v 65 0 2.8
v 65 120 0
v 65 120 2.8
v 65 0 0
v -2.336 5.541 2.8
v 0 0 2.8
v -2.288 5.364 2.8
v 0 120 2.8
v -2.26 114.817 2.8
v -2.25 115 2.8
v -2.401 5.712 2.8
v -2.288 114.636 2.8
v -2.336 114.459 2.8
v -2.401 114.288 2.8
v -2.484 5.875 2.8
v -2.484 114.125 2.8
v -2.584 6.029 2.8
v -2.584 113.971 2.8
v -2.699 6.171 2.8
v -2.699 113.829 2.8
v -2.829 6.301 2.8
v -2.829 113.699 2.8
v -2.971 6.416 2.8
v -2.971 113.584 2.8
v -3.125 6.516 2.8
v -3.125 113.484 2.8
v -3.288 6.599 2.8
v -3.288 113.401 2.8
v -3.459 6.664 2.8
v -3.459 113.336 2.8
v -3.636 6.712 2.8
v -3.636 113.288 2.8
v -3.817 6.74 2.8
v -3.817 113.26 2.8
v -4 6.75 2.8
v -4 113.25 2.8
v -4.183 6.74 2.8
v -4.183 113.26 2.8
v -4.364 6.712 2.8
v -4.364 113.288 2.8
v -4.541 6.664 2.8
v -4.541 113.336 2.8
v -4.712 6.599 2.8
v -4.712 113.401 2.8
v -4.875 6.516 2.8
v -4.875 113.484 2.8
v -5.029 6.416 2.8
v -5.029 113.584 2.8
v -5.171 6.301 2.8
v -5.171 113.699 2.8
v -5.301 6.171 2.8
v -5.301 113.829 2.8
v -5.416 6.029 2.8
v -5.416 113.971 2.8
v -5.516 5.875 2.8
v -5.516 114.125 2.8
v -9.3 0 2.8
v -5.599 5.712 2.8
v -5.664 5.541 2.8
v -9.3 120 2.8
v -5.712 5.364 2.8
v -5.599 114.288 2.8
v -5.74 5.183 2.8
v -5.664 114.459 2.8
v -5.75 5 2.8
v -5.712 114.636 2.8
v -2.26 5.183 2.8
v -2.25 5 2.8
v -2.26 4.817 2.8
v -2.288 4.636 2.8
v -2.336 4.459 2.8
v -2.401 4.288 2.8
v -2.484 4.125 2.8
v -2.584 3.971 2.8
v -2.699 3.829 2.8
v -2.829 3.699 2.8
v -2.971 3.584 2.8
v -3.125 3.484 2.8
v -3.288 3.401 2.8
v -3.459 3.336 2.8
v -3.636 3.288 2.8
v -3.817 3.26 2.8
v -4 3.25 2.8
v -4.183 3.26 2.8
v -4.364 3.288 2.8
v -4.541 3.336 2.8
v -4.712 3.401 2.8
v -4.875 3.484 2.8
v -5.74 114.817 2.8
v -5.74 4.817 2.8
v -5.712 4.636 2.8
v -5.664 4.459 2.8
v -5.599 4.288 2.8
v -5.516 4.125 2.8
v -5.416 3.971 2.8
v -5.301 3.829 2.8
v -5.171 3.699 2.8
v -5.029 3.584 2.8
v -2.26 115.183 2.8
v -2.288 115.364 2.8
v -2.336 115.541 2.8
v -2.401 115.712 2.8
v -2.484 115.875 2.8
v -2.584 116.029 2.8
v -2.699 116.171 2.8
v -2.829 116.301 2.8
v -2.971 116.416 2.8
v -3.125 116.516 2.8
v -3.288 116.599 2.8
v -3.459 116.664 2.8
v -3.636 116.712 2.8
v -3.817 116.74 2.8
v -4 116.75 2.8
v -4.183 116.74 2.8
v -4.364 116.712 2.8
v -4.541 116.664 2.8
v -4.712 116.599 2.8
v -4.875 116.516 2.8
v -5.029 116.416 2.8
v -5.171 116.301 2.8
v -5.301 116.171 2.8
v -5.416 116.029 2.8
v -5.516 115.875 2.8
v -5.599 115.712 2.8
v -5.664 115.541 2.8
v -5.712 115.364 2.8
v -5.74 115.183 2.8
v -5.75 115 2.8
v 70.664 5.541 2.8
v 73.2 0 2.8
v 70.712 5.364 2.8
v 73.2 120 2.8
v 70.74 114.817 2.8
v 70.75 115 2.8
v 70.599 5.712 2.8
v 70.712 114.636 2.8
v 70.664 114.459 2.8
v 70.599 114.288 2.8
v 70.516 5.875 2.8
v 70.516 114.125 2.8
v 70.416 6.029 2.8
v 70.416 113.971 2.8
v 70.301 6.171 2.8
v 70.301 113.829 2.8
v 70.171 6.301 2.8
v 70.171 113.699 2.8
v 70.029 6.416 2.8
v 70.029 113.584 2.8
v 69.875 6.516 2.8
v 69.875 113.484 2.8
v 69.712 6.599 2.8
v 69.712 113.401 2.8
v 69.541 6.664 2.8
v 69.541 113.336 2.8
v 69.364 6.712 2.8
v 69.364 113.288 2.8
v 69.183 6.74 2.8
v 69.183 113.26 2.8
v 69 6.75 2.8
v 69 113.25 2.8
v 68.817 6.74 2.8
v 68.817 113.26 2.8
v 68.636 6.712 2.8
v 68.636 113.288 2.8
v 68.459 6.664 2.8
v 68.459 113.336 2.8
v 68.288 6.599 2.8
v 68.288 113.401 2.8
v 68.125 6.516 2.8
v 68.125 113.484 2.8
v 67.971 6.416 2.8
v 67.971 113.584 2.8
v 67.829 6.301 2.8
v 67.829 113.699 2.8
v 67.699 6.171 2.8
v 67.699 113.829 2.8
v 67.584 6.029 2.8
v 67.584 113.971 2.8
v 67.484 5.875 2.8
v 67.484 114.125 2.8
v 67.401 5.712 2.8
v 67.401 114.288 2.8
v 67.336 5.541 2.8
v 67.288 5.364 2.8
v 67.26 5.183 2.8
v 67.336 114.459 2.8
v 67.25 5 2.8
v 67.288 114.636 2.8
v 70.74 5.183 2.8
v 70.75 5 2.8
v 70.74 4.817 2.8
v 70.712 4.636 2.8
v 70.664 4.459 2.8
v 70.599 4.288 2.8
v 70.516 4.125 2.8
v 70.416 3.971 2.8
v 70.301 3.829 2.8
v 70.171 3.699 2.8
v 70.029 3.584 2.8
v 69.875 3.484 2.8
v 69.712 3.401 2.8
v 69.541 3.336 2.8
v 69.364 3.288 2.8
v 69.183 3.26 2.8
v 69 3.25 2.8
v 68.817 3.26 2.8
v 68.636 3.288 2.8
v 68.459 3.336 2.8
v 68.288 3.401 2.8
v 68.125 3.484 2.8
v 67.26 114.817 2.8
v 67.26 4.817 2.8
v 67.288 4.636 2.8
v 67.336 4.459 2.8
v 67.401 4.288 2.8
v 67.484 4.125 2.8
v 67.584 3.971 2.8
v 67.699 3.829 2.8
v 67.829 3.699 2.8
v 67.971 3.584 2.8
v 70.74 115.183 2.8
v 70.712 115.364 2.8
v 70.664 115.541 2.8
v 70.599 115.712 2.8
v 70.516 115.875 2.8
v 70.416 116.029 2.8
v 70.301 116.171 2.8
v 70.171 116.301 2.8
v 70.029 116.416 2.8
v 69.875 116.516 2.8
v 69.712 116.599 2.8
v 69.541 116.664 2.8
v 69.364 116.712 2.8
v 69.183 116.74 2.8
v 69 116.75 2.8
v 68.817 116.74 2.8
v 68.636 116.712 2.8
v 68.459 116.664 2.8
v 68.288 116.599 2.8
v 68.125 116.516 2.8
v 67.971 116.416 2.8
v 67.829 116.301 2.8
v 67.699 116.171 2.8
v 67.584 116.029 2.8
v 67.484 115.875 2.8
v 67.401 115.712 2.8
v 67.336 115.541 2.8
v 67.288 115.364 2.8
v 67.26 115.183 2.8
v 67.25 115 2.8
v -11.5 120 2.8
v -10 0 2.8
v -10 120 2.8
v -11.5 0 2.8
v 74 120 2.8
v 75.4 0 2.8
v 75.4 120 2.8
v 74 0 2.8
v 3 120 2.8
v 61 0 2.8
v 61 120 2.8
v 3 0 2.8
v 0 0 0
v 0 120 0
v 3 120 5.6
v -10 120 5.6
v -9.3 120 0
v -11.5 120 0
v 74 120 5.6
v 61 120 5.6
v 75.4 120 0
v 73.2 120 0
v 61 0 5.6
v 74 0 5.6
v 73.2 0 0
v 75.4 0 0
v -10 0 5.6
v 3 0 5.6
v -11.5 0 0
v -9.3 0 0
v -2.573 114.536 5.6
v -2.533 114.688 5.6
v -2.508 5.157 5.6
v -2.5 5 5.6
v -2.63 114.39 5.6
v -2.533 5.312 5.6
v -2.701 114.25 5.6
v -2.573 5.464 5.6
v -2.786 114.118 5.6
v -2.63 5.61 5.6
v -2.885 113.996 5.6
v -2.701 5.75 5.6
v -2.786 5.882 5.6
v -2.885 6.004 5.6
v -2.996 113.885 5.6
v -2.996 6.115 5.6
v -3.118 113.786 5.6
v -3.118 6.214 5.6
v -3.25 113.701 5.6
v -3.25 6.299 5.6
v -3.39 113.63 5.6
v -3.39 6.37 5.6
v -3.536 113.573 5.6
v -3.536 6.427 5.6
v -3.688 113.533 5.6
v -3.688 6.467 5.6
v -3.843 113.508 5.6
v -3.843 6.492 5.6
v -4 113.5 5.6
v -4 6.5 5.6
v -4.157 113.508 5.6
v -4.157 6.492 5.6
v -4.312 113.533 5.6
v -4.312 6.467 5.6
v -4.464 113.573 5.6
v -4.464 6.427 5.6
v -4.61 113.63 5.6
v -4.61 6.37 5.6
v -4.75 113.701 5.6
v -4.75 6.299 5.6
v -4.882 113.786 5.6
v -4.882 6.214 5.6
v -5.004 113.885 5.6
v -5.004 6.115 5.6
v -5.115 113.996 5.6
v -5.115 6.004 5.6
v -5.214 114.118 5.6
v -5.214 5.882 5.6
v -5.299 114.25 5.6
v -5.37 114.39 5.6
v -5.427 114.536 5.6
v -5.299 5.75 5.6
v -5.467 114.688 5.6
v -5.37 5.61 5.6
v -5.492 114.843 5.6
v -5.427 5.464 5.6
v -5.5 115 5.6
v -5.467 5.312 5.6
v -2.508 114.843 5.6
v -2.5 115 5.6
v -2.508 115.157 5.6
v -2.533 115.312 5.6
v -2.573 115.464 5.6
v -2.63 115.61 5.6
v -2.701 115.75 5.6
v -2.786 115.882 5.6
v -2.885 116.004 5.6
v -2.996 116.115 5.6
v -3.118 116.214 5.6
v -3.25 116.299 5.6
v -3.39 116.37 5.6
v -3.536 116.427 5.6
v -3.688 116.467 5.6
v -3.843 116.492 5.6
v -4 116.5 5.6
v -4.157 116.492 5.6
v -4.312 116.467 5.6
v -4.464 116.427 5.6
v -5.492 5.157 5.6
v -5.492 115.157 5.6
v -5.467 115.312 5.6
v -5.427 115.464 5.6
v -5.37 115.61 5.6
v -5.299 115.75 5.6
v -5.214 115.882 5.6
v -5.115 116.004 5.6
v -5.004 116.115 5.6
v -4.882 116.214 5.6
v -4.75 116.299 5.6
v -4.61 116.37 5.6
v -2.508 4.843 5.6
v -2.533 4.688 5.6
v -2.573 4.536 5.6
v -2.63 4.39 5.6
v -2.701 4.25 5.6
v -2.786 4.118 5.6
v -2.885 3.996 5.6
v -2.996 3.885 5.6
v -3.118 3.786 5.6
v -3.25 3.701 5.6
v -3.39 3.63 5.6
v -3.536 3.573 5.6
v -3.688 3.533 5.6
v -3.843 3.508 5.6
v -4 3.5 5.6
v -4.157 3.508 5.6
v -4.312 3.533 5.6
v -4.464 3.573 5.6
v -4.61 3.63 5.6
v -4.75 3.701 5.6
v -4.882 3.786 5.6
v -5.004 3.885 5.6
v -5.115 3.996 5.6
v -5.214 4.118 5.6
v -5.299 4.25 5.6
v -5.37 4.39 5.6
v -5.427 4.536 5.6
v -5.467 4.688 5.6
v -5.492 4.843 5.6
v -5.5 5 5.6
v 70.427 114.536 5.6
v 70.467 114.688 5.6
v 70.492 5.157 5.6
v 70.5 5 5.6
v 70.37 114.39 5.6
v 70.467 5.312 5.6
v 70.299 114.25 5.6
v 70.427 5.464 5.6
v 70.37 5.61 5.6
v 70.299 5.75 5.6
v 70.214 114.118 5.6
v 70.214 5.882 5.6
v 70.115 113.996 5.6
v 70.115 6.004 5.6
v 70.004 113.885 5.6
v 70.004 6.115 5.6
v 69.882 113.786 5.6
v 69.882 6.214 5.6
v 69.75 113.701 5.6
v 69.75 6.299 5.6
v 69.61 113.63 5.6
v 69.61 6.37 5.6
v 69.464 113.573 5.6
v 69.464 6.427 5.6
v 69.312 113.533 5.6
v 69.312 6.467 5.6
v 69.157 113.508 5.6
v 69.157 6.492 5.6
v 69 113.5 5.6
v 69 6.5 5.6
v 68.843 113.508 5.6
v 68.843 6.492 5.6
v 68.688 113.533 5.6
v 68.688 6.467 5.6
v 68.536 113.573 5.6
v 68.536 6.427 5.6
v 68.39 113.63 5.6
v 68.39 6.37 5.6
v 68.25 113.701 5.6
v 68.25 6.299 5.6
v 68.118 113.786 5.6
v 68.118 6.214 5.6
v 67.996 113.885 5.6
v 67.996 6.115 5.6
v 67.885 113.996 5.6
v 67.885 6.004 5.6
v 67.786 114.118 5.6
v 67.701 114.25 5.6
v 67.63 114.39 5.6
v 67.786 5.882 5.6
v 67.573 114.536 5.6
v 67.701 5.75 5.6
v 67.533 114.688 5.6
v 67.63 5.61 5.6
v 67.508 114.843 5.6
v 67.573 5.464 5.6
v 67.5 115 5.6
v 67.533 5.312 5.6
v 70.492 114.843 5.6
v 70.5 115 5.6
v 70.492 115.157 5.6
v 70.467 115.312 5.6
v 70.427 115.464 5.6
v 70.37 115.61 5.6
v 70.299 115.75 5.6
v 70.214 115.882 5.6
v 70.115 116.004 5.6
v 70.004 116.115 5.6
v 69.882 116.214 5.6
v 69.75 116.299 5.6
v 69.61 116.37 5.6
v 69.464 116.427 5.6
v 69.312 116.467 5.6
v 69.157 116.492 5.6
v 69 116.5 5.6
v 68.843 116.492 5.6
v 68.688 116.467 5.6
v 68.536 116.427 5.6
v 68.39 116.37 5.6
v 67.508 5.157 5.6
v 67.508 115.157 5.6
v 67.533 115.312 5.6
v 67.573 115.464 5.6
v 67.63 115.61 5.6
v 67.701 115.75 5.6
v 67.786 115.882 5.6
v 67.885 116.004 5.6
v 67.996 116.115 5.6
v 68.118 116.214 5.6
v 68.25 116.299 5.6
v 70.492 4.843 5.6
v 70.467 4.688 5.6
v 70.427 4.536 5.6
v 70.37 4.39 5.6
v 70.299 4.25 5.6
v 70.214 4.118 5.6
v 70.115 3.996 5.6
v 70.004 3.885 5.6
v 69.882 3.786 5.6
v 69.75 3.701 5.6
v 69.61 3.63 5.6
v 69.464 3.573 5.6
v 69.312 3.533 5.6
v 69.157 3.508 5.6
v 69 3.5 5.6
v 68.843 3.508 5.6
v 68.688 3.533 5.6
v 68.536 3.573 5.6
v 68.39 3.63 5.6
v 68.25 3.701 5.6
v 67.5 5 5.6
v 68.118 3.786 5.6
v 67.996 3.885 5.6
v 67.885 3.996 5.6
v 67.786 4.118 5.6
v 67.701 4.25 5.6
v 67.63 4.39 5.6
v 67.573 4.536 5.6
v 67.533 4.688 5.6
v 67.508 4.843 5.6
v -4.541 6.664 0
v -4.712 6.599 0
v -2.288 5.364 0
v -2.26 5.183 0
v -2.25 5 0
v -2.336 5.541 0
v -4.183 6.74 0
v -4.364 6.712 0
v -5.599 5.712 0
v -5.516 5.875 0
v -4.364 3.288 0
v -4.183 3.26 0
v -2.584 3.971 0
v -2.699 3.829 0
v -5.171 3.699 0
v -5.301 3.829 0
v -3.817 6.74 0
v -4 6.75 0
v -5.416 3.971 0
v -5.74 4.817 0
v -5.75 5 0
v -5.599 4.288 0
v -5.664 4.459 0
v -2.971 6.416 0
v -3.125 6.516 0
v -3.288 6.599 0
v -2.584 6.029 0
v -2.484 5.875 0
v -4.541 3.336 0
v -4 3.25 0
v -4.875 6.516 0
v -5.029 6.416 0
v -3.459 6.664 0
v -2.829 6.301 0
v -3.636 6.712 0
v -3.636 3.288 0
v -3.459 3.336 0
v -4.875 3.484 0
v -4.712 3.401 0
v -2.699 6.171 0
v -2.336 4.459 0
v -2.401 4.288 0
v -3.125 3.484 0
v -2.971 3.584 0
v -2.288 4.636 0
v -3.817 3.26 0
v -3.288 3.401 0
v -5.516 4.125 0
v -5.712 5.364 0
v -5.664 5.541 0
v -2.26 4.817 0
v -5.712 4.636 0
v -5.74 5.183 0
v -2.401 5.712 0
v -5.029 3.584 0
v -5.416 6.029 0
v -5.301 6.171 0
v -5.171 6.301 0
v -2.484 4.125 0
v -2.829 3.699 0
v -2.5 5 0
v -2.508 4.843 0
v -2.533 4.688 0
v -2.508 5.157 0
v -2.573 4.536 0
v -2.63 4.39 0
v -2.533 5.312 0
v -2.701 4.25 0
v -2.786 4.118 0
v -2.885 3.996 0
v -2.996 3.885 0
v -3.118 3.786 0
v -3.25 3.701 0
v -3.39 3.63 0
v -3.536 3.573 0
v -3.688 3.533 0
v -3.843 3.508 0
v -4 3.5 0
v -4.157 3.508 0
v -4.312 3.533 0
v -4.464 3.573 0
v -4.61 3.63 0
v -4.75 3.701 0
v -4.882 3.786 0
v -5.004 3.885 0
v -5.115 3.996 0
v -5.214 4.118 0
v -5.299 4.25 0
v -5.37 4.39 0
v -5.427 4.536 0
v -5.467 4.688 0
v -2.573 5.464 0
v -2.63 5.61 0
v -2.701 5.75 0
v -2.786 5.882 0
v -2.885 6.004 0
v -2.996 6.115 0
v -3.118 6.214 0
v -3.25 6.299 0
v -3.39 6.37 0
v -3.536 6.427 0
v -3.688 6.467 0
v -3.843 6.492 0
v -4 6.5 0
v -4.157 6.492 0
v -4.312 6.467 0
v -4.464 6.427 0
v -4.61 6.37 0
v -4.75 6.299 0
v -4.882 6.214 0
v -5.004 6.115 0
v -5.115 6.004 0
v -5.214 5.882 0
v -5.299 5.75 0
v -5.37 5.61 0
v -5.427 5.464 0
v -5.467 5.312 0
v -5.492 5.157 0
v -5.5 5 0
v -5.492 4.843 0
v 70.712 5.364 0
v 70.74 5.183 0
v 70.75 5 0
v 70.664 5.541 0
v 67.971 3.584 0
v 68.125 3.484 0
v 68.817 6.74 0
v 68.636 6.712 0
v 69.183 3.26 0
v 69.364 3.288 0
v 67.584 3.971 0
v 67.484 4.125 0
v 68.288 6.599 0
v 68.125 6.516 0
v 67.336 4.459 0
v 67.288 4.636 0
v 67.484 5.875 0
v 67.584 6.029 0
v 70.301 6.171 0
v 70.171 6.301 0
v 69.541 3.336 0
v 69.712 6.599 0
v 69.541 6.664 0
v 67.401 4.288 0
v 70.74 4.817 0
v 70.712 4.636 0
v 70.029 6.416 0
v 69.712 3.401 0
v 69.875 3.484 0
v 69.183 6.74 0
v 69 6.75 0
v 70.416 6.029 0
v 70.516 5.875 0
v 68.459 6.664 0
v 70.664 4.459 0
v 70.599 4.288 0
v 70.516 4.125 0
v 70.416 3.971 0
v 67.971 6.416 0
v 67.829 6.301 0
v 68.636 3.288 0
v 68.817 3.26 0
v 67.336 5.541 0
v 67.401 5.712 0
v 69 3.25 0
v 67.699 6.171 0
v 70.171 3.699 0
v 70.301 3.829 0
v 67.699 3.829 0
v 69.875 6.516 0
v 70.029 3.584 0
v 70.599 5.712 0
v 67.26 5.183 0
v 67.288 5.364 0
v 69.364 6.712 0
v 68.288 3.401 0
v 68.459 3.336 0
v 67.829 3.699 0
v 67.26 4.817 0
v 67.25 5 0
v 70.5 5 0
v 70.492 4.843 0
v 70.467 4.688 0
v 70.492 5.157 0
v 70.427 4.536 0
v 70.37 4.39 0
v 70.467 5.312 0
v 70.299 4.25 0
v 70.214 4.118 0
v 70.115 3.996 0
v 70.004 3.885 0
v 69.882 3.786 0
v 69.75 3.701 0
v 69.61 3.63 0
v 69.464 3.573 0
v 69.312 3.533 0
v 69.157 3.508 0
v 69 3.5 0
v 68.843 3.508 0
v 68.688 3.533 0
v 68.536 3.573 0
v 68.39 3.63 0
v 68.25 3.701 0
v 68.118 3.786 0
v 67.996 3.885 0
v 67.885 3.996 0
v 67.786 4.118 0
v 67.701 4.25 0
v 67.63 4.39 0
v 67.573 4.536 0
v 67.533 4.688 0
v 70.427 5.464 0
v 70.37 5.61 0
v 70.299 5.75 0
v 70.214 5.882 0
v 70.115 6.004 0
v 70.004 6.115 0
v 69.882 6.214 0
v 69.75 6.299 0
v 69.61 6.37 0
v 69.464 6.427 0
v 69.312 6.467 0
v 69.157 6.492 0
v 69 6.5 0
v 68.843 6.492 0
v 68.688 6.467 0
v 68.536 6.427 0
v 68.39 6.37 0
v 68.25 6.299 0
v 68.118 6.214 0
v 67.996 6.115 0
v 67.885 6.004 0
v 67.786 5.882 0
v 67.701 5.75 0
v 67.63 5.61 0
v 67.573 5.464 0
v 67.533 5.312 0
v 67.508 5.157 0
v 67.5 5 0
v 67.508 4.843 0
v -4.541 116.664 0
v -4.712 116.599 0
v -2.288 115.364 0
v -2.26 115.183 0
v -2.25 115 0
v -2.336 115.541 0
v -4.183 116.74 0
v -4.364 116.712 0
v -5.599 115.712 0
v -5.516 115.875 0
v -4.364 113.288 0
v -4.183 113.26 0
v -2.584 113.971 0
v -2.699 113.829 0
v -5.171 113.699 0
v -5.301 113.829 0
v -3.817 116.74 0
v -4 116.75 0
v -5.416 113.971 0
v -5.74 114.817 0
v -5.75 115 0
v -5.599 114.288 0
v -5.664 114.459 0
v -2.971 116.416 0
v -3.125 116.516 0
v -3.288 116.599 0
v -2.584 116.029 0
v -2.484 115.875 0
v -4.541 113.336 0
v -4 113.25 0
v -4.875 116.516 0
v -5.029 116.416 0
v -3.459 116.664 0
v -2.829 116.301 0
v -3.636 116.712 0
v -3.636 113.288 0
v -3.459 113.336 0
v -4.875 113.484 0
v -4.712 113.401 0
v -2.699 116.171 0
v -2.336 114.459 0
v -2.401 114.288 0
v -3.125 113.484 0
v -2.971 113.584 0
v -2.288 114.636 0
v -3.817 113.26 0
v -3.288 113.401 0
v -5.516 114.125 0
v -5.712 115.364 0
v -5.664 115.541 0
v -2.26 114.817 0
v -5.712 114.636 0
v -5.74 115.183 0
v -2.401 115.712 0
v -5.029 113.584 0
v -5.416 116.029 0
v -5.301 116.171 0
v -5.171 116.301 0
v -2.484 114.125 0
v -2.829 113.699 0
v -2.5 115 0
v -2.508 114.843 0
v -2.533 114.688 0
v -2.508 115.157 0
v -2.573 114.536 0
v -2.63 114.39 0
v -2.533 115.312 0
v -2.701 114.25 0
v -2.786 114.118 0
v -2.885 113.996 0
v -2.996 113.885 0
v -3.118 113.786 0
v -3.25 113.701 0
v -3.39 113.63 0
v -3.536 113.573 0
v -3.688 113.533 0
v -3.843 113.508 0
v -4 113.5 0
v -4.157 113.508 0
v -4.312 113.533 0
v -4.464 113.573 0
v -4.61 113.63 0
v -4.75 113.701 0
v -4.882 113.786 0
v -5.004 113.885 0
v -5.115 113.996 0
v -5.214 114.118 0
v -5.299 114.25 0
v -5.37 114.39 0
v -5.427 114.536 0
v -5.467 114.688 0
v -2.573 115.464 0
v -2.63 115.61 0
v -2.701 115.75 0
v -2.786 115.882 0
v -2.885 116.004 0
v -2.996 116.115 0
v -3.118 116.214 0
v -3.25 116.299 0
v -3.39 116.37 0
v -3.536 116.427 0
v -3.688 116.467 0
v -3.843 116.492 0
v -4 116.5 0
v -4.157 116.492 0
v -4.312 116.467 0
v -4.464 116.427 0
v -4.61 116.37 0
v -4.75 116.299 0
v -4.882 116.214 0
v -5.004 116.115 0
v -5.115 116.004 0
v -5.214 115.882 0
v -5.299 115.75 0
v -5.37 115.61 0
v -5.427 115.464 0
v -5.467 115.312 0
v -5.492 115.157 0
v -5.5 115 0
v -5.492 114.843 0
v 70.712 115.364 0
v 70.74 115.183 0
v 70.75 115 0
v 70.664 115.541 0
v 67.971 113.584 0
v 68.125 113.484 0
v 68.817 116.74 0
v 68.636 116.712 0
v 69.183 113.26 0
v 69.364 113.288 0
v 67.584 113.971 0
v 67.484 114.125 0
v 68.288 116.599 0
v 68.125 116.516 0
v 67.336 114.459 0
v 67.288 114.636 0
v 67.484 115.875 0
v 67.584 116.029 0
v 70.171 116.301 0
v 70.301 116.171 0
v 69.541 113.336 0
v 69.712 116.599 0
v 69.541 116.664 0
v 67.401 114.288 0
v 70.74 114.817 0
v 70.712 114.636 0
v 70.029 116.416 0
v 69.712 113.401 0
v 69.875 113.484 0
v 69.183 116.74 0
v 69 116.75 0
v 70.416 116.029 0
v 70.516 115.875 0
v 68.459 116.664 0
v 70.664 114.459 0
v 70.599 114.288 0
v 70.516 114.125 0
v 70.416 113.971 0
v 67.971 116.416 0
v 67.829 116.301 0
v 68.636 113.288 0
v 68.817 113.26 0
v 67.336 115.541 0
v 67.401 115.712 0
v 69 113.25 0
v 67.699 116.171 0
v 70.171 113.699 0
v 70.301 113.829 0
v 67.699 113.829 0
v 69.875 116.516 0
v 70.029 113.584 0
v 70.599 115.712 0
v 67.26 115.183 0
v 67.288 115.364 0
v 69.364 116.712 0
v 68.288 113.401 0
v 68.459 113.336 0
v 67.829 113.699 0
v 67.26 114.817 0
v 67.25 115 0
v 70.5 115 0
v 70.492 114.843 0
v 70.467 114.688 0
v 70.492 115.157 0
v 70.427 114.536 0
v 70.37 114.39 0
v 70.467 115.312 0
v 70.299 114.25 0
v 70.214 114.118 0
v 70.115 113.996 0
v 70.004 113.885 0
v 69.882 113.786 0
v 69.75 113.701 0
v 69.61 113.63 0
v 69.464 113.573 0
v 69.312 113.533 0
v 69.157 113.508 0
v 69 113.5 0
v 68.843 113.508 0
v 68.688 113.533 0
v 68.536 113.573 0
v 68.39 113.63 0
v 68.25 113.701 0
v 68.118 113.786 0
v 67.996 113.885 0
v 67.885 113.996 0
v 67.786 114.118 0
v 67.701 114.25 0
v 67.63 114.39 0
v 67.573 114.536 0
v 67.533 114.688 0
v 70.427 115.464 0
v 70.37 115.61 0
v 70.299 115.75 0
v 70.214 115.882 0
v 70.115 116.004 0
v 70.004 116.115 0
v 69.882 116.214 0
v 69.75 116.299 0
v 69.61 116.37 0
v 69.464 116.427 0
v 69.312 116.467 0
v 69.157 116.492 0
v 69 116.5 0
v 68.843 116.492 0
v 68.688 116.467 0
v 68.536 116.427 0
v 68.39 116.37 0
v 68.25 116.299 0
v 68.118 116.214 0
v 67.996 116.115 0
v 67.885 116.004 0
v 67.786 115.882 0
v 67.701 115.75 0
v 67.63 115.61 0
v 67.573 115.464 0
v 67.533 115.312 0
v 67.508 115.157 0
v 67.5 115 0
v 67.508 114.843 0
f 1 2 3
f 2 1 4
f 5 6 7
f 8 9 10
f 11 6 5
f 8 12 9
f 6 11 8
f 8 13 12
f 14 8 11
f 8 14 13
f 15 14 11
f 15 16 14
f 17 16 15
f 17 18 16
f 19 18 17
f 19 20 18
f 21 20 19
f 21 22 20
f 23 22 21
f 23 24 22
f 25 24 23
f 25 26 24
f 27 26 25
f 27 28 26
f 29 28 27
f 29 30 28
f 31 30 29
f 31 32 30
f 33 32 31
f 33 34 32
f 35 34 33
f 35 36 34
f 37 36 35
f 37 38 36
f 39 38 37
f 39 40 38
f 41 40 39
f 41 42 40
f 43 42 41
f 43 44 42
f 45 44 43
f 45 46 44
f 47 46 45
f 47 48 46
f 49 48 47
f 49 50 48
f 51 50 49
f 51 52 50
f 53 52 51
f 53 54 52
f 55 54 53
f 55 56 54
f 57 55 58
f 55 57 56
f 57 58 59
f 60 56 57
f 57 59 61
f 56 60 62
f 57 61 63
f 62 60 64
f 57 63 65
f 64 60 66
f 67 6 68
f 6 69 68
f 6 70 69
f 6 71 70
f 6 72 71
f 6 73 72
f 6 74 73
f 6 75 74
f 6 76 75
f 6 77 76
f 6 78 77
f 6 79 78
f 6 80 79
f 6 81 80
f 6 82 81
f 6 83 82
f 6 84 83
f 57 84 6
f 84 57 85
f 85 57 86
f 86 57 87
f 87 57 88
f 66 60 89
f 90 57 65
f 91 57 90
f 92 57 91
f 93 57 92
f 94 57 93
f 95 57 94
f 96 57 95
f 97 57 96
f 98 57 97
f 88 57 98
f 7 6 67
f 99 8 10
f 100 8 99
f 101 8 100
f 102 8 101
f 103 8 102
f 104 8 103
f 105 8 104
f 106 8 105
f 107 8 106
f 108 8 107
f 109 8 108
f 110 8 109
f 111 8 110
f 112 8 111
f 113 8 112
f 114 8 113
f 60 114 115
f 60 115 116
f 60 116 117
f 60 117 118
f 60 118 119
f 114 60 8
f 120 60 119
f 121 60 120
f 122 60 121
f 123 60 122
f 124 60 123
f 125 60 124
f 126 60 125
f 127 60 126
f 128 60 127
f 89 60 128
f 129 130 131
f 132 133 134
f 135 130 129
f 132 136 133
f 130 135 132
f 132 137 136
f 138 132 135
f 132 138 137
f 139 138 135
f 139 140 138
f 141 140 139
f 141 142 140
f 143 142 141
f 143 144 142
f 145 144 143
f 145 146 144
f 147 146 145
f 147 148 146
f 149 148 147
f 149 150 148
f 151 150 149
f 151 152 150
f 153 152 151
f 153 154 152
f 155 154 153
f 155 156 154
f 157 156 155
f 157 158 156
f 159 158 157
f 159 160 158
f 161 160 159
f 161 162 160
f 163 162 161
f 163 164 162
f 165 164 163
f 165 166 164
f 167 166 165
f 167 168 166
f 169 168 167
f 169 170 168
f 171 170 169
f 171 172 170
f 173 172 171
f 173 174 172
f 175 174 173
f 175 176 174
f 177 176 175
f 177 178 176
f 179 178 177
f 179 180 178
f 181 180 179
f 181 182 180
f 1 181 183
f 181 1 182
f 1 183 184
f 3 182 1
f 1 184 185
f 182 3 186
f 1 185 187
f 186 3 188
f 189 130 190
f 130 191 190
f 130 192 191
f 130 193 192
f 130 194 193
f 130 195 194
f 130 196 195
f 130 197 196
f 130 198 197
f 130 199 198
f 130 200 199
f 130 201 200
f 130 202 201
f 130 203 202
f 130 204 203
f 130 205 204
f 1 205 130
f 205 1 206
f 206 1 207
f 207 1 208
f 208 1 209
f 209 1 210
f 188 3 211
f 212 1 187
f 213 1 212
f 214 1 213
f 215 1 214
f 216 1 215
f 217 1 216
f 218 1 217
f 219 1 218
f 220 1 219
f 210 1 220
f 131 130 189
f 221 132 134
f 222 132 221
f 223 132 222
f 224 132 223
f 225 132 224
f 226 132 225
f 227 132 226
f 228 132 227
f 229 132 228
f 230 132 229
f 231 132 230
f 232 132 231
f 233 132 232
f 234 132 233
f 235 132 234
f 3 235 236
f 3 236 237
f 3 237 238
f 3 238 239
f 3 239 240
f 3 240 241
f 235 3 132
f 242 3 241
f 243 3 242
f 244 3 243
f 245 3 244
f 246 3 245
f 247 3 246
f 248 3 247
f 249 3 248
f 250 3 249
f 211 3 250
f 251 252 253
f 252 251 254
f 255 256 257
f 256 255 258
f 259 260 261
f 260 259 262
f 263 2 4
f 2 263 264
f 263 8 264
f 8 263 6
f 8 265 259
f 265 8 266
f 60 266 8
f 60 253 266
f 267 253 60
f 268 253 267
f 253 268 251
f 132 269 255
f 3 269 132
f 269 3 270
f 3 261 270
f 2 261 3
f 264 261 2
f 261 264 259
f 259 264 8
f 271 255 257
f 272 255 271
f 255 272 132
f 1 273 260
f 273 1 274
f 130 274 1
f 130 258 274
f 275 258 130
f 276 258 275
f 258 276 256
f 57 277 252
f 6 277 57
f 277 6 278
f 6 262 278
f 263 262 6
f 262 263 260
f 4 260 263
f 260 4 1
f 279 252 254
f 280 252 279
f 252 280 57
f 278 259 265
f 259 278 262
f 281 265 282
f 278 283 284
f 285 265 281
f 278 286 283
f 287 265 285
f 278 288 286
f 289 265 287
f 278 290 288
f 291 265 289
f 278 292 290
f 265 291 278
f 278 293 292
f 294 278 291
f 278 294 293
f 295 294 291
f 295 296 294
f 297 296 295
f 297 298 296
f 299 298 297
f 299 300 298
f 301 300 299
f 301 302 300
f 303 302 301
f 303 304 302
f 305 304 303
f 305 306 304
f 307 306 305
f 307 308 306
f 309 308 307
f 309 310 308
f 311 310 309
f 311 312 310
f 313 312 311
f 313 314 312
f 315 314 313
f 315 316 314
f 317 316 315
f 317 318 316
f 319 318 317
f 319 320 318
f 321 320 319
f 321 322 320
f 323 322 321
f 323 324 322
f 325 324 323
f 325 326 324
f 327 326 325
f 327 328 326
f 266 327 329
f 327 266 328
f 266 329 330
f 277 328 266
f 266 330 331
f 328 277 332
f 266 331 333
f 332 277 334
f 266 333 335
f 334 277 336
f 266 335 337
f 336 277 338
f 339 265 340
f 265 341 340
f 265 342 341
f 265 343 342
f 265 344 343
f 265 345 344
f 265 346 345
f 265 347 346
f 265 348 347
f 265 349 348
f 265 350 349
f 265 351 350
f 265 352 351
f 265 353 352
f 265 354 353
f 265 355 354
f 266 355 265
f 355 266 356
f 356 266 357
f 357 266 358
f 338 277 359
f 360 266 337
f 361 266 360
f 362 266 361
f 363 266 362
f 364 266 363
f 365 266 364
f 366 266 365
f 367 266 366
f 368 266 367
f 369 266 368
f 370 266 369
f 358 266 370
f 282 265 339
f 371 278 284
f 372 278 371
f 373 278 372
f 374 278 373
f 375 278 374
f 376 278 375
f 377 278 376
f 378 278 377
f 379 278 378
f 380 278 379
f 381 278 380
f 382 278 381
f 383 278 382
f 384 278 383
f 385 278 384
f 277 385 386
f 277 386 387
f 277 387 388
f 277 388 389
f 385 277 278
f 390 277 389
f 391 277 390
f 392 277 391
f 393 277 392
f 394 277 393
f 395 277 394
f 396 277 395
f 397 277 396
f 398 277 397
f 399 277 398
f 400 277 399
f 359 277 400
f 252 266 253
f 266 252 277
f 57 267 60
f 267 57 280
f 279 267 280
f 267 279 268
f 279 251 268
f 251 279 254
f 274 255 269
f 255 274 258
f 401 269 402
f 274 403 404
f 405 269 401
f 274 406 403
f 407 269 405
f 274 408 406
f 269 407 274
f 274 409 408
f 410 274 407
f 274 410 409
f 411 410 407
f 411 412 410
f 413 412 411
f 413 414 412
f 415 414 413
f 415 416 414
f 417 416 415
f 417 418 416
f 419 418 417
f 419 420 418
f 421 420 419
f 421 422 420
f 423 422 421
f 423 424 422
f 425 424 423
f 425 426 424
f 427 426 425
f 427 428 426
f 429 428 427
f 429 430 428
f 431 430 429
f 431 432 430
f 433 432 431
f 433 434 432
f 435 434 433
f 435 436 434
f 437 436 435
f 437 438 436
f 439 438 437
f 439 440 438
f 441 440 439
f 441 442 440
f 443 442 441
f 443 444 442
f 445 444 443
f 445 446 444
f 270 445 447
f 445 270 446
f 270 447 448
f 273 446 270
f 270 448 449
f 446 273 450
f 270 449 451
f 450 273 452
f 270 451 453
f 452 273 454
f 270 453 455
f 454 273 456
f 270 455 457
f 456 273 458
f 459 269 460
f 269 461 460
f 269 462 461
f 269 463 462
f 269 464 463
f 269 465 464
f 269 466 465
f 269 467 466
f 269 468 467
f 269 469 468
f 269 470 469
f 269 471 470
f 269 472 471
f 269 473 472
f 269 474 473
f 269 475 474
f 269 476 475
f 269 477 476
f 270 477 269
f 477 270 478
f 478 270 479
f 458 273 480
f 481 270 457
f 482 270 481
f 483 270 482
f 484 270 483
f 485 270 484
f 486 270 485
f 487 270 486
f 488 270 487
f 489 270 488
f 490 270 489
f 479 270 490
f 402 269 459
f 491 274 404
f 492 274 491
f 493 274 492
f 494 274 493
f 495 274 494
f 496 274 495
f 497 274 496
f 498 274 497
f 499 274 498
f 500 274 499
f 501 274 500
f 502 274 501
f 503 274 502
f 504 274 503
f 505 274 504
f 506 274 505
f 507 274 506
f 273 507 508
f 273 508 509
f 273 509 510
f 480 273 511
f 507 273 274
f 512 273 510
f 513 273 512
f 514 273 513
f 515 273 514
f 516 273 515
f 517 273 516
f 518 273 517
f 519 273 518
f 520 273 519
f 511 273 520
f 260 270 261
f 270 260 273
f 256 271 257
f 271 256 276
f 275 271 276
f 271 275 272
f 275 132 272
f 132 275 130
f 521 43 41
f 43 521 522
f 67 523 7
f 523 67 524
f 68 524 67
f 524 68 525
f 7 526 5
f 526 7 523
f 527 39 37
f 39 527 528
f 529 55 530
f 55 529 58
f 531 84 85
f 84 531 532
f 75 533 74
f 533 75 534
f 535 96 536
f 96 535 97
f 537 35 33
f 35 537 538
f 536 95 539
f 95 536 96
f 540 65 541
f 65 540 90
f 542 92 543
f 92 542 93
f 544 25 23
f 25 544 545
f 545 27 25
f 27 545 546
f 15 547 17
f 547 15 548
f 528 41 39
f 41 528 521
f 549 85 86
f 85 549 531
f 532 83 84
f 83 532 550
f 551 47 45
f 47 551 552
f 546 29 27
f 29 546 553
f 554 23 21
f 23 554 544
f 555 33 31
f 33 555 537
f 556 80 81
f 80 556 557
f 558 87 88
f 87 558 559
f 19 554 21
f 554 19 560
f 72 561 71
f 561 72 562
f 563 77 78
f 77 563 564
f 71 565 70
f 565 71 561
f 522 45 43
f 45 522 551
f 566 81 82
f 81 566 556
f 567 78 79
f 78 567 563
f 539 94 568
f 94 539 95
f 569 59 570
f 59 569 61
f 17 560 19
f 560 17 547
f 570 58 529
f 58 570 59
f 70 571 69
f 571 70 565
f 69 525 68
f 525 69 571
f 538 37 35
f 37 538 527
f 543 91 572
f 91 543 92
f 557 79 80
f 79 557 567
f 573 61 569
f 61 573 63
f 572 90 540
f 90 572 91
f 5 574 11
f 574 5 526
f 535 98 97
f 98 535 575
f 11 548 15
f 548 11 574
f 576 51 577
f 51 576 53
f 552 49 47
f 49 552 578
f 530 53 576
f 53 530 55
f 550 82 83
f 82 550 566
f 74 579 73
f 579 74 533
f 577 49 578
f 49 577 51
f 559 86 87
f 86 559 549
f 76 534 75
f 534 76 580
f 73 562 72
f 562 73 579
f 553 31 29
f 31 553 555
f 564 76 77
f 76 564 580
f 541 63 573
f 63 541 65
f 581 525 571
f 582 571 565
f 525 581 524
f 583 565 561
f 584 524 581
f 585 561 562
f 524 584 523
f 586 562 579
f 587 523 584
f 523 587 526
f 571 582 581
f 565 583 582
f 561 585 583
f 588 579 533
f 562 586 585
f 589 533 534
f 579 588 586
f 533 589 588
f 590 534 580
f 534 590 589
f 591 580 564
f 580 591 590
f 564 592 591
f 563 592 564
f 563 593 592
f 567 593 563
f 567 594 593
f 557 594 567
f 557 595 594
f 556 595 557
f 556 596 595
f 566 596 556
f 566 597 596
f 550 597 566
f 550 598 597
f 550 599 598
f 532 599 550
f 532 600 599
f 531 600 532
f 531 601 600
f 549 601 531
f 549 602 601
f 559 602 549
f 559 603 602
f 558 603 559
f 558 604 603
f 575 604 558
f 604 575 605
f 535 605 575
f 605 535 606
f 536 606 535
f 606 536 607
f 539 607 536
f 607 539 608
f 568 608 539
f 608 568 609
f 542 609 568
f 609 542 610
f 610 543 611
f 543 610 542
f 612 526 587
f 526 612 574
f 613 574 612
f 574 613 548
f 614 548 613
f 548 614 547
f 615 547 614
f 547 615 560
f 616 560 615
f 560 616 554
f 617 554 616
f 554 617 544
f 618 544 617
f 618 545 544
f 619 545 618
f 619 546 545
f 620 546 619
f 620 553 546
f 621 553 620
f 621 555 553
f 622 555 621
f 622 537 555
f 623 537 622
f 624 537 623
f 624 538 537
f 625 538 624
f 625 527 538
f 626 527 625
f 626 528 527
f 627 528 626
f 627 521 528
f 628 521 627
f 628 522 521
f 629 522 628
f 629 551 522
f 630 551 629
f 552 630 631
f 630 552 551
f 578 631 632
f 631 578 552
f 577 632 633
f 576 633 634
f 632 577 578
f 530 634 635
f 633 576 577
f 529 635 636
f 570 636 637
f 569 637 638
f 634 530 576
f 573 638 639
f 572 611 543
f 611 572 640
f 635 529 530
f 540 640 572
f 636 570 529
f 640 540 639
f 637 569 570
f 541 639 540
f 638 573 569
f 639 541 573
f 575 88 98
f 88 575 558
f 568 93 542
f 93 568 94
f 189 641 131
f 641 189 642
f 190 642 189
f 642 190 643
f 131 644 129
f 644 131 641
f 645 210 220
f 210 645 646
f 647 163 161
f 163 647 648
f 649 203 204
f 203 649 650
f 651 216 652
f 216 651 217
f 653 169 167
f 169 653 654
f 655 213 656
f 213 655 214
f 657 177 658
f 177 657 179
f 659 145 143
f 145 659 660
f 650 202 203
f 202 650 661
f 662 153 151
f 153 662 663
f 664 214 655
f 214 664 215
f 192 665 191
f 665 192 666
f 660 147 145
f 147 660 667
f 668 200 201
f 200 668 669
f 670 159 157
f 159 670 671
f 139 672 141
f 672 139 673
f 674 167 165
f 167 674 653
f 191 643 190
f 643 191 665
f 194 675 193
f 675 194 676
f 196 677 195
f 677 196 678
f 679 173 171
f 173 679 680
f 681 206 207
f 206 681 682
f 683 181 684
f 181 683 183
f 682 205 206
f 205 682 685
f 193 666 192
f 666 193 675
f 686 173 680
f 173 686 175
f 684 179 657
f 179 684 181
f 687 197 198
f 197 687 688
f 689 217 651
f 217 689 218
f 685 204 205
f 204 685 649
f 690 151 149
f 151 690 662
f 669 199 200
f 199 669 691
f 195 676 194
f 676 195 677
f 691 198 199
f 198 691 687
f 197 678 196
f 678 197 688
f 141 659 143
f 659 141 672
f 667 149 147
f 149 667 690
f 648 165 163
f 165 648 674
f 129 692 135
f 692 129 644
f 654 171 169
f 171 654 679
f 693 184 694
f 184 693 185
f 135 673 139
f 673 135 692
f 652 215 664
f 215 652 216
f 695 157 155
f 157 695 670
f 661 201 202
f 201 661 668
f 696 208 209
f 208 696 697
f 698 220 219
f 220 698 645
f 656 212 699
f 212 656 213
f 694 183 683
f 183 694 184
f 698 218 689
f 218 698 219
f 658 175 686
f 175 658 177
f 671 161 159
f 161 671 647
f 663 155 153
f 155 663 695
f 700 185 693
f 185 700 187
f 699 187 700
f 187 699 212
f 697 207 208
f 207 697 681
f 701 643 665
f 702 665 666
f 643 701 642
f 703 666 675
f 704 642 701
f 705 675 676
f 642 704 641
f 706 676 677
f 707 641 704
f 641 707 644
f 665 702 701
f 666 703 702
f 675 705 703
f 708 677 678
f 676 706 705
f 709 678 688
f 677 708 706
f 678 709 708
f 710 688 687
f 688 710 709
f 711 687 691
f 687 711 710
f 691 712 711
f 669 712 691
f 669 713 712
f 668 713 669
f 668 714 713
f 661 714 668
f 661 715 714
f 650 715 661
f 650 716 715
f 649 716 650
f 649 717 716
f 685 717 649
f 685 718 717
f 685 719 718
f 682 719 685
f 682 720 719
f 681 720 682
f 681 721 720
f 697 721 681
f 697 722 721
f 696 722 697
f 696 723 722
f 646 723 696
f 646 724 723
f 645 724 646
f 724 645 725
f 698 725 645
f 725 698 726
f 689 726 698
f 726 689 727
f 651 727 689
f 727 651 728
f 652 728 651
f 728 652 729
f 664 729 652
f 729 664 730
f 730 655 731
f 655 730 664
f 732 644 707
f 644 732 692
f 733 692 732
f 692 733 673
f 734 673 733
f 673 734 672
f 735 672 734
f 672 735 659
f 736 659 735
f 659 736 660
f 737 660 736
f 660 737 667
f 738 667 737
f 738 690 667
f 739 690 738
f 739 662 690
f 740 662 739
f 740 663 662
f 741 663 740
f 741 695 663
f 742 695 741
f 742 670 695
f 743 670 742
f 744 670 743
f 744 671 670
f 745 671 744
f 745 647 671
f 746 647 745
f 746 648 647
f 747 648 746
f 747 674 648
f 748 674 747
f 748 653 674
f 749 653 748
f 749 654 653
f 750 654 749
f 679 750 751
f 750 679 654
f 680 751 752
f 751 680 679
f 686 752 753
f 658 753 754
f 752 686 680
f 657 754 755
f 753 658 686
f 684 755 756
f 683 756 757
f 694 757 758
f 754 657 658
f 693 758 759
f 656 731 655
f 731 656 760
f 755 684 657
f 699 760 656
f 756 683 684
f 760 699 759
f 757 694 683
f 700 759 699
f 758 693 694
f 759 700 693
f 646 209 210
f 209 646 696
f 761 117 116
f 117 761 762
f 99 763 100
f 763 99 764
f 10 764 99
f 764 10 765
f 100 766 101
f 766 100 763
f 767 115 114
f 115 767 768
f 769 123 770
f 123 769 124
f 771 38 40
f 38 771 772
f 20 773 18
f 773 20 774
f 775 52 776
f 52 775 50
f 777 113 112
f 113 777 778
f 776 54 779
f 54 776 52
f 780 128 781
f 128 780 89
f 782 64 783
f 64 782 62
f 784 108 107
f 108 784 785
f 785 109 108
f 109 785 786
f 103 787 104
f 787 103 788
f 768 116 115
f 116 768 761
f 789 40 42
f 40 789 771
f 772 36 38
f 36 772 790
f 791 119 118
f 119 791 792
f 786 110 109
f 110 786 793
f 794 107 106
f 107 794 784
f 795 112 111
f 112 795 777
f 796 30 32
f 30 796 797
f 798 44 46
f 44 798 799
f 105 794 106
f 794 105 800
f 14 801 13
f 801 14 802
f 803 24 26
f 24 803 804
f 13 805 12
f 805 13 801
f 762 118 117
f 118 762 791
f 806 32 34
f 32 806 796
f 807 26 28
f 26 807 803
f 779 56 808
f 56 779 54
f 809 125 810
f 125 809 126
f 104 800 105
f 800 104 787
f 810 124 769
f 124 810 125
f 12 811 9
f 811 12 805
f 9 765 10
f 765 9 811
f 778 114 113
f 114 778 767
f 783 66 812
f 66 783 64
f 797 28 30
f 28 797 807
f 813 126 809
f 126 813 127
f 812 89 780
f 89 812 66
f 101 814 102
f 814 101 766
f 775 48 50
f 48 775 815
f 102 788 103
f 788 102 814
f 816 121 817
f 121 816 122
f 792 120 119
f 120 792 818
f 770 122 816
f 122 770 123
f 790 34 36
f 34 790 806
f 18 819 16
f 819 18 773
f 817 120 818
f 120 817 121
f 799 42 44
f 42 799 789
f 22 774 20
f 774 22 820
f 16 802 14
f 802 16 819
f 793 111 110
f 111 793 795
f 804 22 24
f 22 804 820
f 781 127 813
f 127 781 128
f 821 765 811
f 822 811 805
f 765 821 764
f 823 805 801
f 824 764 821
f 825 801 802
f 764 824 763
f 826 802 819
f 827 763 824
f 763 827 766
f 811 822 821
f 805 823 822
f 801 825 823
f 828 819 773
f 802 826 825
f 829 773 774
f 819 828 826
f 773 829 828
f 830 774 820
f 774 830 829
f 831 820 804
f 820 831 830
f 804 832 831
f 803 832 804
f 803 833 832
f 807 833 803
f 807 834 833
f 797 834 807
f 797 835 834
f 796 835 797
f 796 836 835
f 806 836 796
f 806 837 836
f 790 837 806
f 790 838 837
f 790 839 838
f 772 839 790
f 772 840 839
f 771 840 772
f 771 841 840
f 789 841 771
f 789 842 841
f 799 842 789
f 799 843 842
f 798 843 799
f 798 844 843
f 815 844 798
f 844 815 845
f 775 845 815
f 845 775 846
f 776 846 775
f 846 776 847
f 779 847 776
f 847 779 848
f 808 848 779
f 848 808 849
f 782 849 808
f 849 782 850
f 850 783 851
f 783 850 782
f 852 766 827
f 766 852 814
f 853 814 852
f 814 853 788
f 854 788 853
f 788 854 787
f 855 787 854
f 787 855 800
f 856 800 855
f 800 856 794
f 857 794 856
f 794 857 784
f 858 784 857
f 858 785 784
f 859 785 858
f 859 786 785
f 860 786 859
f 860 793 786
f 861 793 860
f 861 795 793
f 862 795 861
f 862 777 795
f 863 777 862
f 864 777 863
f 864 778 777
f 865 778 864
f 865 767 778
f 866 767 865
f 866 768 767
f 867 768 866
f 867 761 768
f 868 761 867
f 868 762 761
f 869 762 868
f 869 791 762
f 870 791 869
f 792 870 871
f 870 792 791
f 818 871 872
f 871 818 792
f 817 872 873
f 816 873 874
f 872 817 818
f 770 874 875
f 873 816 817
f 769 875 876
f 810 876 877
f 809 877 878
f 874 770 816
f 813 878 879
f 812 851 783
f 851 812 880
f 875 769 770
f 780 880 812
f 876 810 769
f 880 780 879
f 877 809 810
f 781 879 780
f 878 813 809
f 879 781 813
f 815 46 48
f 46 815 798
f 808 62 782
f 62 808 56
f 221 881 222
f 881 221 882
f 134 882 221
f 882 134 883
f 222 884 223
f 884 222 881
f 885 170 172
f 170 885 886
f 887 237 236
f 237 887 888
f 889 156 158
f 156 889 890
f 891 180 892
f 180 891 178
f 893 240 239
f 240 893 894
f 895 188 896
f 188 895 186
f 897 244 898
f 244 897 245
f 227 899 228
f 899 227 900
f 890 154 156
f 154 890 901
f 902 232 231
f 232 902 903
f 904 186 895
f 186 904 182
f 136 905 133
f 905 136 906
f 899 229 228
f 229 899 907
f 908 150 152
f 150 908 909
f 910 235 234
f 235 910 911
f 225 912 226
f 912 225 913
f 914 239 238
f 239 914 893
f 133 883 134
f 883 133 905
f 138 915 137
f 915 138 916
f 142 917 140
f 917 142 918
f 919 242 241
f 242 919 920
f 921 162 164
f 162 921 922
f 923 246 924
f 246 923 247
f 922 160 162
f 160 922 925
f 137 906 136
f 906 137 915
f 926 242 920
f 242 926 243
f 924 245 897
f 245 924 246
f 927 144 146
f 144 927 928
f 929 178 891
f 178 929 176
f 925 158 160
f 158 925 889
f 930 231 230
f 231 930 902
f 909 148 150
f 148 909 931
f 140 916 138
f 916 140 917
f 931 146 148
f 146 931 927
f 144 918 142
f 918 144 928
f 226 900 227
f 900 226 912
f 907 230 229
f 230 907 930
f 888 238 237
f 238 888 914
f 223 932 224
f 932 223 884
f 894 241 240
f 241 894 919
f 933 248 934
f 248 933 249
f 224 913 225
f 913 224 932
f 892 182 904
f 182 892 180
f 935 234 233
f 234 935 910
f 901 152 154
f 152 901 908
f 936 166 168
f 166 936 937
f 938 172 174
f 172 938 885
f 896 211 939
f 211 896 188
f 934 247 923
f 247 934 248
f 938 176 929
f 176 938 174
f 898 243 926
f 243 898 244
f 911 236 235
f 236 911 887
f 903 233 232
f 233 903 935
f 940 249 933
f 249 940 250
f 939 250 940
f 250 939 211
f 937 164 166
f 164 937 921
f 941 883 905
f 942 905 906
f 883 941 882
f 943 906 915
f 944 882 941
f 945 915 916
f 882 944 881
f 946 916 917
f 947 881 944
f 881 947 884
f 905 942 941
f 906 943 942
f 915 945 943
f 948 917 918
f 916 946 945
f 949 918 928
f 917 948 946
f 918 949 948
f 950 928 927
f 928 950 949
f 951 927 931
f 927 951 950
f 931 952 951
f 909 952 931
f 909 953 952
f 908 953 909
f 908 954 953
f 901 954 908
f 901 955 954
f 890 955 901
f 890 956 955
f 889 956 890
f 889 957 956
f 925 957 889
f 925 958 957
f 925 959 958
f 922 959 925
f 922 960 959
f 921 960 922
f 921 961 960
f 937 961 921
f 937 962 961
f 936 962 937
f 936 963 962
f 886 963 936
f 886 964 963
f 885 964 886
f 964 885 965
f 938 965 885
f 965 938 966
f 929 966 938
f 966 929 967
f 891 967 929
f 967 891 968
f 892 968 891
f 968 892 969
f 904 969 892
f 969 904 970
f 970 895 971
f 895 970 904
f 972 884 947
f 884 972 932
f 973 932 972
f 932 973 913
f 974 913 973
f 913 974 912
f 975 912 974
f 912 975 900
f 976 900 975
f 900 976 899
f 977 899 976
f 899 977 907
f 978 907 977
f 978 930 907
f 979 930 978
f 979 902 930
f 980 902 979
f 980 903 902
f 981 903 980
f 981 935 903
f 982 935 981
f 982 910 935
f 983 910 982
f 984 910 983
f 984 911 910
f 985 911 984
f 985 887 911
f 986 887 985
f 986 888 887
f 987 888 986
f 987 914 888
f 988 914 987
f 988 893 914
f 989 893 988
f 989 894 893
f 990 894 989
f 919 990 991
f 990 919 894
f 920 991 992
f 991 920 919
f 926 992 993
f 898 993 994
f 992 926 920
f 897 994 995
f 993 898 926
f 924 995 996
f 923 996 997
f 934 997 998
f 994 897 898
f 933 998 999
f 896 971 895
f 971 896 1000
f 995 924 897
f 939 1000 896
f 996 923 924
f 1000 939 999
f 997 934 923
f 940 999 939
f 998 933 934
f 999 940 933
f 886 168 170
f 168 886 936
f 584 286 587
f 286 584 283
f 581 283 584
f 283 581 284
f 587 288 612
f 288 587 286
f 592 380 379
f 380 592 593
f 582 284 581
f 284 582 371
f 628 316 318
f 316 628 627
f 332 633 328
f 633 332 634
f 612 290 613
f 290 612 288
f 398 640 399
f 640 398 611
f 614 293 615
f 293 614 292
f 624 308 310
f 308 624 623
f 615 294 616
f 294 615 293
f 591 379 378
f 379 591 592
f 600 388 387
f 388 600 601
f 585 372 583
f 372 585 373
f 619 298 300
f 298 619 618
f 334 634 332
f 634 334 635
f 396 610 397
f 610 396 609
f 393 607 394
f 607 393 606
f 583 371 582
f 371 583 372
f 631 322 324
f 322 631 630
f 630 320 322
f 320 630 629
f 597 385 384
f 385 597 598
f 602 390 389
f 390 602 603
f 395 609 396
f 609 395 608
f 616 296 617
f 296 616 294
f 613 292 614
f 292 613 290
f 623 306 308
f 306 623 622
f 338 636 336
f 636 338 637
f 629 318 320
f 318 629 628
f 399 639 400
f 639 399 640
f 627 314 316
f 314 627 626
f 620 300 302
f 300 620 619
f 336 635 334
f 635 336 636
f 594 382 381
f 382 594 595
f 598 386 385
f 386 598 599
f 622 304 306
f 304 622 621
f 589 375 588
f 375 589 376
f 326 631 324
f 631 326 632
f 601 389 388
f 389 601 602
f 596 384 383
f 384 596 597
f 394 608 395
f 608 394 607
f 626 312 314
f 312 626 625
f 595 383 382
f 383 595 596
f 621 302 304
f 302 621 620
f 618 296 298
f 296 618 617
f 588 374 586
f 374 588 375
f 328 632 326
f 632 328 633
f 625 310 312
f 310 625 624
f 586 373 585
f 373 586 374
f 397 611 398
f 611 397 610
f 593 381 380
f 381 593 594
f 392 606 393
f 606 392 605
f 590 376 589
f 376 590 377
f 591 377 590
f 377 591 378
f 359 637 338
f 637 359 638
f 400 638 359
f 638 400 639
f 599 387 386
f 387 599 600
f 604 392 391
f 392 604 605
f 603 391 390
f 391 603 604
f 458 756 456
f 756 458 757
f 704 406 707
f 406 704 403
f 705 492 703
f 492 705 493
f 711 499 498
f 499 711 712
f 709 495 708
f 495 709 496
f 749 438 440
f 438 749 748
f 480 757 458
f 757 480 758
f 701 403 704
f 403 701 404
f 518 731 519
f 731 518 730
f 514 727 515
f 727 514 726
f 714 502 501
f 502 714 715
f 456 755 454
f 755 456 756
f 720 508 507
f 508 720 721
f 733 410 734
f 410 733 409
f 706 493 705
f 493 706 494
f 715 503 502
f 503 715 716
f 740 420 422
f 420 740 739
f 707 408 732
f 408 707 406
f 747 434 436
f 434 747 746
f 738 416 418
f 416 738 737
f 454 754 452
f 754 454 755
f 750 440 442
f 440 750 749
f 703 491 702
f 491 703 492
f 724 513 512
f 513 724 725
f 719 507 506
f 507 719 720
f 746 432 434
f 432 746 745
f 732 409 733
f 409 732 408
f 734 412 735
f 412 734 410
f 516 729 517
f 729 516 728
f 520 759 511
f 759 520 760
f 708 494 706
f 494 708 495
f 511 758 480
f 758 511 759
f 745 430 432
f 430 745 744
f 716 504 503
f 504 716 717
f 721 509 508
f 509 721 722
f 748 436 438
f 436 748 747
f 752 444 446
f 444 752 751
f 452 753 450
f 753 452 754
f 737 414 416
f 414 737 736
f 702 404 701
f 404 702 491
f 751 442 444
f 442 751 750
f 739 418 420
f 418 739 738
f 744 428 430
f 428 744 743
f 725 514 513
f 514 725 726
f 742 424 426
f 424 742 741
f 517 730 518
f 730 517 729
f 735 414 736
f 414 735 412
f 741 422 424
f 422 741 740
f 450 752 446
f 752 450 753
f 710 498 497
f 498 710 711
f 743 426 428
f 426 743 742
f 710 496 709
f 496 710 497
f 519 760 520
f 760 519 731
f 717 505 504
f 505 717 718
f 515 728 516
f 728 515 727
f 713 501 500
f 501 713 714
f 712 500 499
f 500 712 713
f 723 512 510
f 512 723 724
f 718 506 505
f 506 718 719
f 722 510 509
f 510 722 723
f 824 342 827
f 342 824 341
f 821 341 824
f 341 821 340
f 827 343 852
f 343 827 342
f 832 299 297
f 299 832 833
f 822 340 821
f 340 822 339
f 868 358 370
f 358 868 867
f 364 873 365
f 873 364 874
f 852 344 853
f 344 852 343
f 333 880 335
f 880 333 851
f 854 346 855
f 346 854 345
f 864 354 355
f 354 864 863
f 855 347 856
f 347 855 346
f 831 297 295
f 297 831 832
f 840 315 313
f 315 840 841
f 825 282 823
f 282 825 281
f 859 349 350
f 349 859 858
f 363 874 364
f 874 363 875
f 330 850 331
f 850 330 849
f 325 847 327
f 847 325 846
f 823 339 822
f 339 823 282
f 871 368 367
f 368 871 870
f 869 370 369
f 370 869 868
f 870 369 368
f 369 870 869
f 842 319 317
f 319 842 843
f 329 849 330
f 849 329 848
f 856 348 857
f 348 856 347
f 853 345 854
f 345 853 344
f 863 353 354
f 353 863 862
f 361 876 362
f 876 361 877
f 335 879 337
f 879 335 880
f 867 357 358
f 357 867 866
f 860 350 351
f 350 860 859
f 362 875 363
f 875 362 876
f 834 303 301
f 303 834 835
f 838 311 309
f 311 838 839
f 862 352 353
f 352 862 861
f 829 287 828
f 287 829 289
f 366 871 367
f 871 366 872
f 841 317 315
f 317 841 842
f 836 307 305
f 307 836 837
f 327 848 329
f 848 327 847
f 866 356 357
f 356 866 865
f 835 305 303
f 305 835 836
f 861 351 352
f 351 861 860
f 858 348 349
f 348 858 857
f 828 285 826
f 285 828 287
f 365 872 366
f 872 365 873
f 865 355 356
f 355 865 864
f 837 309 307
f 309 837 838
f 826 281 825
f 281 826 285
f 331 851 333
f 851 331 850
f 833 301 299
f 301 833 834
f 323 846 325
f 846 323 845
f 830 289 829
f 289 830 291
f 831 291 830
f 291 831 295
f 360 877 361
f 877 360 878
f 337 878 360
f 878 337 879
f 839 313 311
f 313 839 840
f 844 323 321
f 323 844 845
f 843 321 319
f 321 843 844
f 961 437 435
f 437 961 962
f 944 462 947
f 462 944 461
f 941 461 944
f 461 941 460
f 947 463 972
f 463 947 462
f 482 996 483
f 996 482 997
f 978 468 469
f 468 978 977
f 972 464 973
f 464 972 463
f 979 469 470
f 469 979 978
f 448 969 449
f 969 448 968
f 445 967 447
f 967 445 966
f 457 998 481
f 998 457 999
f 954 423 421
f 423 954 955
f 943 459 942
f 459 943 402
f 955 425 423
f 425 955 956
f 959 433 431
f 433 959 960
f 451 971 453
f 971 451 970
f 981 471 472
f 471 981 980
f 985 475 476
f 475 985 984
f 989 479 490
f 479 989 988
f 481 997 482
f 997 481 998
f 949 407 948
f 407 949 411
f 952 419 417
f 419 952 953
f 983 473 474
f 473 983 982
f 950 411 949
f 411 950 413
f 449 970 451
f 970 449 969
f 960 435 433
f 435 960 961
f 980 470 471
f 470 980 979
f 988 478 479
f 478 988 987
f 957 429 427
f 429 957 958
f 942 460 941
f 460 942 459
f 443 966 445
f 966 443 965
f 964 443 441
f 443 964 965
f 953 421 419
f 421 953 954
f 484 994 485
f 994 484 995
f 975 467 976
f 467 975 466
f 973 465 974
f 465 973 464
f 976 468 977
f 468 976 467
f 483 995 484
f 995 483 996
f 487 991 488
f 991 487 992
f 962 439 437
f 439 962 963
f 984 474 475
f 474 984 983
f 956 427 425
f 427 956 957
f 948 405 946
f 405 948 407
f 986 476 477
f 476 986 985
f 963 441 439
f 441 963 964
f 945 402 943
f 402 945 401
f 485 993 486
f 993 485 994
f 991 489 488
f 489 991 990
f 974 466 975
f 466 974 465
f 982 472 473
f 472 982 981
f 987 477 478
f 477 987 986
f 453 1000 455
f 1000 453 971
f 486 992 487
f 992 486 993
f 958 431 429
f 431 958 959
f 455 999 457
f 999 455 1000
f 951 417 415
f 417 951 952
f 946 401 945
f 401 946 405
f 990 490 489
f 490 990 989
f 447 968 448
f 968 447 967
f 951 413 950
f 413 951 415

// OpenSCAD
//include <fan_grille.scad>
include <inc/rack_item.scad>


module cover(h=120){
  difference() {
    union() {
    	cube([65,h,2.8]);

    	translate([-10,0,2.8]) cube([13,h,2.8]);
    	translate([-11.5,0,  0]) cube([2.2,h,2.8]);

    	translate([66-5,0,2.8]) cube([13,h,2.8]);
    	translate([65+10-1.8,0,0]) cube([2.2,h,2.8]);

	    translate([-5+1,5,0]) cylinder(d=3.5,h=2.8);
	    translate([65+5-1,5,0]) cylinder(d=3.5,h=2.8);
	    translate([-5+1,120-5,0]) cylinder(d=3.5,h=2.8);
	    translate([65+5-1,120-5,0]) cylinder(d=3.5,h=2.8);

    }
    translate([-5+1,5,0]) cylinder(d=3,h=10);
    translate([65+5-1,5,0]) cylinder(d=3,h=10);
    translate([-5+1,120-5,0]) cylinder(d=3,h=10);
    translate([65+5-1,120-5,0]) cylinder(d=3,h=10);
  }
}

//translate([0,0, 0]) both_parts(drive=true, power=false, board=false);
//translate([0,0,40]) both_parts(drive=true, power=false, board=false);
//translate([0,0,80]) both_parts(drive=true, power=false, board=false);
//translate([-90.5,212,0]) rotate([90,0,0])
  cover();
